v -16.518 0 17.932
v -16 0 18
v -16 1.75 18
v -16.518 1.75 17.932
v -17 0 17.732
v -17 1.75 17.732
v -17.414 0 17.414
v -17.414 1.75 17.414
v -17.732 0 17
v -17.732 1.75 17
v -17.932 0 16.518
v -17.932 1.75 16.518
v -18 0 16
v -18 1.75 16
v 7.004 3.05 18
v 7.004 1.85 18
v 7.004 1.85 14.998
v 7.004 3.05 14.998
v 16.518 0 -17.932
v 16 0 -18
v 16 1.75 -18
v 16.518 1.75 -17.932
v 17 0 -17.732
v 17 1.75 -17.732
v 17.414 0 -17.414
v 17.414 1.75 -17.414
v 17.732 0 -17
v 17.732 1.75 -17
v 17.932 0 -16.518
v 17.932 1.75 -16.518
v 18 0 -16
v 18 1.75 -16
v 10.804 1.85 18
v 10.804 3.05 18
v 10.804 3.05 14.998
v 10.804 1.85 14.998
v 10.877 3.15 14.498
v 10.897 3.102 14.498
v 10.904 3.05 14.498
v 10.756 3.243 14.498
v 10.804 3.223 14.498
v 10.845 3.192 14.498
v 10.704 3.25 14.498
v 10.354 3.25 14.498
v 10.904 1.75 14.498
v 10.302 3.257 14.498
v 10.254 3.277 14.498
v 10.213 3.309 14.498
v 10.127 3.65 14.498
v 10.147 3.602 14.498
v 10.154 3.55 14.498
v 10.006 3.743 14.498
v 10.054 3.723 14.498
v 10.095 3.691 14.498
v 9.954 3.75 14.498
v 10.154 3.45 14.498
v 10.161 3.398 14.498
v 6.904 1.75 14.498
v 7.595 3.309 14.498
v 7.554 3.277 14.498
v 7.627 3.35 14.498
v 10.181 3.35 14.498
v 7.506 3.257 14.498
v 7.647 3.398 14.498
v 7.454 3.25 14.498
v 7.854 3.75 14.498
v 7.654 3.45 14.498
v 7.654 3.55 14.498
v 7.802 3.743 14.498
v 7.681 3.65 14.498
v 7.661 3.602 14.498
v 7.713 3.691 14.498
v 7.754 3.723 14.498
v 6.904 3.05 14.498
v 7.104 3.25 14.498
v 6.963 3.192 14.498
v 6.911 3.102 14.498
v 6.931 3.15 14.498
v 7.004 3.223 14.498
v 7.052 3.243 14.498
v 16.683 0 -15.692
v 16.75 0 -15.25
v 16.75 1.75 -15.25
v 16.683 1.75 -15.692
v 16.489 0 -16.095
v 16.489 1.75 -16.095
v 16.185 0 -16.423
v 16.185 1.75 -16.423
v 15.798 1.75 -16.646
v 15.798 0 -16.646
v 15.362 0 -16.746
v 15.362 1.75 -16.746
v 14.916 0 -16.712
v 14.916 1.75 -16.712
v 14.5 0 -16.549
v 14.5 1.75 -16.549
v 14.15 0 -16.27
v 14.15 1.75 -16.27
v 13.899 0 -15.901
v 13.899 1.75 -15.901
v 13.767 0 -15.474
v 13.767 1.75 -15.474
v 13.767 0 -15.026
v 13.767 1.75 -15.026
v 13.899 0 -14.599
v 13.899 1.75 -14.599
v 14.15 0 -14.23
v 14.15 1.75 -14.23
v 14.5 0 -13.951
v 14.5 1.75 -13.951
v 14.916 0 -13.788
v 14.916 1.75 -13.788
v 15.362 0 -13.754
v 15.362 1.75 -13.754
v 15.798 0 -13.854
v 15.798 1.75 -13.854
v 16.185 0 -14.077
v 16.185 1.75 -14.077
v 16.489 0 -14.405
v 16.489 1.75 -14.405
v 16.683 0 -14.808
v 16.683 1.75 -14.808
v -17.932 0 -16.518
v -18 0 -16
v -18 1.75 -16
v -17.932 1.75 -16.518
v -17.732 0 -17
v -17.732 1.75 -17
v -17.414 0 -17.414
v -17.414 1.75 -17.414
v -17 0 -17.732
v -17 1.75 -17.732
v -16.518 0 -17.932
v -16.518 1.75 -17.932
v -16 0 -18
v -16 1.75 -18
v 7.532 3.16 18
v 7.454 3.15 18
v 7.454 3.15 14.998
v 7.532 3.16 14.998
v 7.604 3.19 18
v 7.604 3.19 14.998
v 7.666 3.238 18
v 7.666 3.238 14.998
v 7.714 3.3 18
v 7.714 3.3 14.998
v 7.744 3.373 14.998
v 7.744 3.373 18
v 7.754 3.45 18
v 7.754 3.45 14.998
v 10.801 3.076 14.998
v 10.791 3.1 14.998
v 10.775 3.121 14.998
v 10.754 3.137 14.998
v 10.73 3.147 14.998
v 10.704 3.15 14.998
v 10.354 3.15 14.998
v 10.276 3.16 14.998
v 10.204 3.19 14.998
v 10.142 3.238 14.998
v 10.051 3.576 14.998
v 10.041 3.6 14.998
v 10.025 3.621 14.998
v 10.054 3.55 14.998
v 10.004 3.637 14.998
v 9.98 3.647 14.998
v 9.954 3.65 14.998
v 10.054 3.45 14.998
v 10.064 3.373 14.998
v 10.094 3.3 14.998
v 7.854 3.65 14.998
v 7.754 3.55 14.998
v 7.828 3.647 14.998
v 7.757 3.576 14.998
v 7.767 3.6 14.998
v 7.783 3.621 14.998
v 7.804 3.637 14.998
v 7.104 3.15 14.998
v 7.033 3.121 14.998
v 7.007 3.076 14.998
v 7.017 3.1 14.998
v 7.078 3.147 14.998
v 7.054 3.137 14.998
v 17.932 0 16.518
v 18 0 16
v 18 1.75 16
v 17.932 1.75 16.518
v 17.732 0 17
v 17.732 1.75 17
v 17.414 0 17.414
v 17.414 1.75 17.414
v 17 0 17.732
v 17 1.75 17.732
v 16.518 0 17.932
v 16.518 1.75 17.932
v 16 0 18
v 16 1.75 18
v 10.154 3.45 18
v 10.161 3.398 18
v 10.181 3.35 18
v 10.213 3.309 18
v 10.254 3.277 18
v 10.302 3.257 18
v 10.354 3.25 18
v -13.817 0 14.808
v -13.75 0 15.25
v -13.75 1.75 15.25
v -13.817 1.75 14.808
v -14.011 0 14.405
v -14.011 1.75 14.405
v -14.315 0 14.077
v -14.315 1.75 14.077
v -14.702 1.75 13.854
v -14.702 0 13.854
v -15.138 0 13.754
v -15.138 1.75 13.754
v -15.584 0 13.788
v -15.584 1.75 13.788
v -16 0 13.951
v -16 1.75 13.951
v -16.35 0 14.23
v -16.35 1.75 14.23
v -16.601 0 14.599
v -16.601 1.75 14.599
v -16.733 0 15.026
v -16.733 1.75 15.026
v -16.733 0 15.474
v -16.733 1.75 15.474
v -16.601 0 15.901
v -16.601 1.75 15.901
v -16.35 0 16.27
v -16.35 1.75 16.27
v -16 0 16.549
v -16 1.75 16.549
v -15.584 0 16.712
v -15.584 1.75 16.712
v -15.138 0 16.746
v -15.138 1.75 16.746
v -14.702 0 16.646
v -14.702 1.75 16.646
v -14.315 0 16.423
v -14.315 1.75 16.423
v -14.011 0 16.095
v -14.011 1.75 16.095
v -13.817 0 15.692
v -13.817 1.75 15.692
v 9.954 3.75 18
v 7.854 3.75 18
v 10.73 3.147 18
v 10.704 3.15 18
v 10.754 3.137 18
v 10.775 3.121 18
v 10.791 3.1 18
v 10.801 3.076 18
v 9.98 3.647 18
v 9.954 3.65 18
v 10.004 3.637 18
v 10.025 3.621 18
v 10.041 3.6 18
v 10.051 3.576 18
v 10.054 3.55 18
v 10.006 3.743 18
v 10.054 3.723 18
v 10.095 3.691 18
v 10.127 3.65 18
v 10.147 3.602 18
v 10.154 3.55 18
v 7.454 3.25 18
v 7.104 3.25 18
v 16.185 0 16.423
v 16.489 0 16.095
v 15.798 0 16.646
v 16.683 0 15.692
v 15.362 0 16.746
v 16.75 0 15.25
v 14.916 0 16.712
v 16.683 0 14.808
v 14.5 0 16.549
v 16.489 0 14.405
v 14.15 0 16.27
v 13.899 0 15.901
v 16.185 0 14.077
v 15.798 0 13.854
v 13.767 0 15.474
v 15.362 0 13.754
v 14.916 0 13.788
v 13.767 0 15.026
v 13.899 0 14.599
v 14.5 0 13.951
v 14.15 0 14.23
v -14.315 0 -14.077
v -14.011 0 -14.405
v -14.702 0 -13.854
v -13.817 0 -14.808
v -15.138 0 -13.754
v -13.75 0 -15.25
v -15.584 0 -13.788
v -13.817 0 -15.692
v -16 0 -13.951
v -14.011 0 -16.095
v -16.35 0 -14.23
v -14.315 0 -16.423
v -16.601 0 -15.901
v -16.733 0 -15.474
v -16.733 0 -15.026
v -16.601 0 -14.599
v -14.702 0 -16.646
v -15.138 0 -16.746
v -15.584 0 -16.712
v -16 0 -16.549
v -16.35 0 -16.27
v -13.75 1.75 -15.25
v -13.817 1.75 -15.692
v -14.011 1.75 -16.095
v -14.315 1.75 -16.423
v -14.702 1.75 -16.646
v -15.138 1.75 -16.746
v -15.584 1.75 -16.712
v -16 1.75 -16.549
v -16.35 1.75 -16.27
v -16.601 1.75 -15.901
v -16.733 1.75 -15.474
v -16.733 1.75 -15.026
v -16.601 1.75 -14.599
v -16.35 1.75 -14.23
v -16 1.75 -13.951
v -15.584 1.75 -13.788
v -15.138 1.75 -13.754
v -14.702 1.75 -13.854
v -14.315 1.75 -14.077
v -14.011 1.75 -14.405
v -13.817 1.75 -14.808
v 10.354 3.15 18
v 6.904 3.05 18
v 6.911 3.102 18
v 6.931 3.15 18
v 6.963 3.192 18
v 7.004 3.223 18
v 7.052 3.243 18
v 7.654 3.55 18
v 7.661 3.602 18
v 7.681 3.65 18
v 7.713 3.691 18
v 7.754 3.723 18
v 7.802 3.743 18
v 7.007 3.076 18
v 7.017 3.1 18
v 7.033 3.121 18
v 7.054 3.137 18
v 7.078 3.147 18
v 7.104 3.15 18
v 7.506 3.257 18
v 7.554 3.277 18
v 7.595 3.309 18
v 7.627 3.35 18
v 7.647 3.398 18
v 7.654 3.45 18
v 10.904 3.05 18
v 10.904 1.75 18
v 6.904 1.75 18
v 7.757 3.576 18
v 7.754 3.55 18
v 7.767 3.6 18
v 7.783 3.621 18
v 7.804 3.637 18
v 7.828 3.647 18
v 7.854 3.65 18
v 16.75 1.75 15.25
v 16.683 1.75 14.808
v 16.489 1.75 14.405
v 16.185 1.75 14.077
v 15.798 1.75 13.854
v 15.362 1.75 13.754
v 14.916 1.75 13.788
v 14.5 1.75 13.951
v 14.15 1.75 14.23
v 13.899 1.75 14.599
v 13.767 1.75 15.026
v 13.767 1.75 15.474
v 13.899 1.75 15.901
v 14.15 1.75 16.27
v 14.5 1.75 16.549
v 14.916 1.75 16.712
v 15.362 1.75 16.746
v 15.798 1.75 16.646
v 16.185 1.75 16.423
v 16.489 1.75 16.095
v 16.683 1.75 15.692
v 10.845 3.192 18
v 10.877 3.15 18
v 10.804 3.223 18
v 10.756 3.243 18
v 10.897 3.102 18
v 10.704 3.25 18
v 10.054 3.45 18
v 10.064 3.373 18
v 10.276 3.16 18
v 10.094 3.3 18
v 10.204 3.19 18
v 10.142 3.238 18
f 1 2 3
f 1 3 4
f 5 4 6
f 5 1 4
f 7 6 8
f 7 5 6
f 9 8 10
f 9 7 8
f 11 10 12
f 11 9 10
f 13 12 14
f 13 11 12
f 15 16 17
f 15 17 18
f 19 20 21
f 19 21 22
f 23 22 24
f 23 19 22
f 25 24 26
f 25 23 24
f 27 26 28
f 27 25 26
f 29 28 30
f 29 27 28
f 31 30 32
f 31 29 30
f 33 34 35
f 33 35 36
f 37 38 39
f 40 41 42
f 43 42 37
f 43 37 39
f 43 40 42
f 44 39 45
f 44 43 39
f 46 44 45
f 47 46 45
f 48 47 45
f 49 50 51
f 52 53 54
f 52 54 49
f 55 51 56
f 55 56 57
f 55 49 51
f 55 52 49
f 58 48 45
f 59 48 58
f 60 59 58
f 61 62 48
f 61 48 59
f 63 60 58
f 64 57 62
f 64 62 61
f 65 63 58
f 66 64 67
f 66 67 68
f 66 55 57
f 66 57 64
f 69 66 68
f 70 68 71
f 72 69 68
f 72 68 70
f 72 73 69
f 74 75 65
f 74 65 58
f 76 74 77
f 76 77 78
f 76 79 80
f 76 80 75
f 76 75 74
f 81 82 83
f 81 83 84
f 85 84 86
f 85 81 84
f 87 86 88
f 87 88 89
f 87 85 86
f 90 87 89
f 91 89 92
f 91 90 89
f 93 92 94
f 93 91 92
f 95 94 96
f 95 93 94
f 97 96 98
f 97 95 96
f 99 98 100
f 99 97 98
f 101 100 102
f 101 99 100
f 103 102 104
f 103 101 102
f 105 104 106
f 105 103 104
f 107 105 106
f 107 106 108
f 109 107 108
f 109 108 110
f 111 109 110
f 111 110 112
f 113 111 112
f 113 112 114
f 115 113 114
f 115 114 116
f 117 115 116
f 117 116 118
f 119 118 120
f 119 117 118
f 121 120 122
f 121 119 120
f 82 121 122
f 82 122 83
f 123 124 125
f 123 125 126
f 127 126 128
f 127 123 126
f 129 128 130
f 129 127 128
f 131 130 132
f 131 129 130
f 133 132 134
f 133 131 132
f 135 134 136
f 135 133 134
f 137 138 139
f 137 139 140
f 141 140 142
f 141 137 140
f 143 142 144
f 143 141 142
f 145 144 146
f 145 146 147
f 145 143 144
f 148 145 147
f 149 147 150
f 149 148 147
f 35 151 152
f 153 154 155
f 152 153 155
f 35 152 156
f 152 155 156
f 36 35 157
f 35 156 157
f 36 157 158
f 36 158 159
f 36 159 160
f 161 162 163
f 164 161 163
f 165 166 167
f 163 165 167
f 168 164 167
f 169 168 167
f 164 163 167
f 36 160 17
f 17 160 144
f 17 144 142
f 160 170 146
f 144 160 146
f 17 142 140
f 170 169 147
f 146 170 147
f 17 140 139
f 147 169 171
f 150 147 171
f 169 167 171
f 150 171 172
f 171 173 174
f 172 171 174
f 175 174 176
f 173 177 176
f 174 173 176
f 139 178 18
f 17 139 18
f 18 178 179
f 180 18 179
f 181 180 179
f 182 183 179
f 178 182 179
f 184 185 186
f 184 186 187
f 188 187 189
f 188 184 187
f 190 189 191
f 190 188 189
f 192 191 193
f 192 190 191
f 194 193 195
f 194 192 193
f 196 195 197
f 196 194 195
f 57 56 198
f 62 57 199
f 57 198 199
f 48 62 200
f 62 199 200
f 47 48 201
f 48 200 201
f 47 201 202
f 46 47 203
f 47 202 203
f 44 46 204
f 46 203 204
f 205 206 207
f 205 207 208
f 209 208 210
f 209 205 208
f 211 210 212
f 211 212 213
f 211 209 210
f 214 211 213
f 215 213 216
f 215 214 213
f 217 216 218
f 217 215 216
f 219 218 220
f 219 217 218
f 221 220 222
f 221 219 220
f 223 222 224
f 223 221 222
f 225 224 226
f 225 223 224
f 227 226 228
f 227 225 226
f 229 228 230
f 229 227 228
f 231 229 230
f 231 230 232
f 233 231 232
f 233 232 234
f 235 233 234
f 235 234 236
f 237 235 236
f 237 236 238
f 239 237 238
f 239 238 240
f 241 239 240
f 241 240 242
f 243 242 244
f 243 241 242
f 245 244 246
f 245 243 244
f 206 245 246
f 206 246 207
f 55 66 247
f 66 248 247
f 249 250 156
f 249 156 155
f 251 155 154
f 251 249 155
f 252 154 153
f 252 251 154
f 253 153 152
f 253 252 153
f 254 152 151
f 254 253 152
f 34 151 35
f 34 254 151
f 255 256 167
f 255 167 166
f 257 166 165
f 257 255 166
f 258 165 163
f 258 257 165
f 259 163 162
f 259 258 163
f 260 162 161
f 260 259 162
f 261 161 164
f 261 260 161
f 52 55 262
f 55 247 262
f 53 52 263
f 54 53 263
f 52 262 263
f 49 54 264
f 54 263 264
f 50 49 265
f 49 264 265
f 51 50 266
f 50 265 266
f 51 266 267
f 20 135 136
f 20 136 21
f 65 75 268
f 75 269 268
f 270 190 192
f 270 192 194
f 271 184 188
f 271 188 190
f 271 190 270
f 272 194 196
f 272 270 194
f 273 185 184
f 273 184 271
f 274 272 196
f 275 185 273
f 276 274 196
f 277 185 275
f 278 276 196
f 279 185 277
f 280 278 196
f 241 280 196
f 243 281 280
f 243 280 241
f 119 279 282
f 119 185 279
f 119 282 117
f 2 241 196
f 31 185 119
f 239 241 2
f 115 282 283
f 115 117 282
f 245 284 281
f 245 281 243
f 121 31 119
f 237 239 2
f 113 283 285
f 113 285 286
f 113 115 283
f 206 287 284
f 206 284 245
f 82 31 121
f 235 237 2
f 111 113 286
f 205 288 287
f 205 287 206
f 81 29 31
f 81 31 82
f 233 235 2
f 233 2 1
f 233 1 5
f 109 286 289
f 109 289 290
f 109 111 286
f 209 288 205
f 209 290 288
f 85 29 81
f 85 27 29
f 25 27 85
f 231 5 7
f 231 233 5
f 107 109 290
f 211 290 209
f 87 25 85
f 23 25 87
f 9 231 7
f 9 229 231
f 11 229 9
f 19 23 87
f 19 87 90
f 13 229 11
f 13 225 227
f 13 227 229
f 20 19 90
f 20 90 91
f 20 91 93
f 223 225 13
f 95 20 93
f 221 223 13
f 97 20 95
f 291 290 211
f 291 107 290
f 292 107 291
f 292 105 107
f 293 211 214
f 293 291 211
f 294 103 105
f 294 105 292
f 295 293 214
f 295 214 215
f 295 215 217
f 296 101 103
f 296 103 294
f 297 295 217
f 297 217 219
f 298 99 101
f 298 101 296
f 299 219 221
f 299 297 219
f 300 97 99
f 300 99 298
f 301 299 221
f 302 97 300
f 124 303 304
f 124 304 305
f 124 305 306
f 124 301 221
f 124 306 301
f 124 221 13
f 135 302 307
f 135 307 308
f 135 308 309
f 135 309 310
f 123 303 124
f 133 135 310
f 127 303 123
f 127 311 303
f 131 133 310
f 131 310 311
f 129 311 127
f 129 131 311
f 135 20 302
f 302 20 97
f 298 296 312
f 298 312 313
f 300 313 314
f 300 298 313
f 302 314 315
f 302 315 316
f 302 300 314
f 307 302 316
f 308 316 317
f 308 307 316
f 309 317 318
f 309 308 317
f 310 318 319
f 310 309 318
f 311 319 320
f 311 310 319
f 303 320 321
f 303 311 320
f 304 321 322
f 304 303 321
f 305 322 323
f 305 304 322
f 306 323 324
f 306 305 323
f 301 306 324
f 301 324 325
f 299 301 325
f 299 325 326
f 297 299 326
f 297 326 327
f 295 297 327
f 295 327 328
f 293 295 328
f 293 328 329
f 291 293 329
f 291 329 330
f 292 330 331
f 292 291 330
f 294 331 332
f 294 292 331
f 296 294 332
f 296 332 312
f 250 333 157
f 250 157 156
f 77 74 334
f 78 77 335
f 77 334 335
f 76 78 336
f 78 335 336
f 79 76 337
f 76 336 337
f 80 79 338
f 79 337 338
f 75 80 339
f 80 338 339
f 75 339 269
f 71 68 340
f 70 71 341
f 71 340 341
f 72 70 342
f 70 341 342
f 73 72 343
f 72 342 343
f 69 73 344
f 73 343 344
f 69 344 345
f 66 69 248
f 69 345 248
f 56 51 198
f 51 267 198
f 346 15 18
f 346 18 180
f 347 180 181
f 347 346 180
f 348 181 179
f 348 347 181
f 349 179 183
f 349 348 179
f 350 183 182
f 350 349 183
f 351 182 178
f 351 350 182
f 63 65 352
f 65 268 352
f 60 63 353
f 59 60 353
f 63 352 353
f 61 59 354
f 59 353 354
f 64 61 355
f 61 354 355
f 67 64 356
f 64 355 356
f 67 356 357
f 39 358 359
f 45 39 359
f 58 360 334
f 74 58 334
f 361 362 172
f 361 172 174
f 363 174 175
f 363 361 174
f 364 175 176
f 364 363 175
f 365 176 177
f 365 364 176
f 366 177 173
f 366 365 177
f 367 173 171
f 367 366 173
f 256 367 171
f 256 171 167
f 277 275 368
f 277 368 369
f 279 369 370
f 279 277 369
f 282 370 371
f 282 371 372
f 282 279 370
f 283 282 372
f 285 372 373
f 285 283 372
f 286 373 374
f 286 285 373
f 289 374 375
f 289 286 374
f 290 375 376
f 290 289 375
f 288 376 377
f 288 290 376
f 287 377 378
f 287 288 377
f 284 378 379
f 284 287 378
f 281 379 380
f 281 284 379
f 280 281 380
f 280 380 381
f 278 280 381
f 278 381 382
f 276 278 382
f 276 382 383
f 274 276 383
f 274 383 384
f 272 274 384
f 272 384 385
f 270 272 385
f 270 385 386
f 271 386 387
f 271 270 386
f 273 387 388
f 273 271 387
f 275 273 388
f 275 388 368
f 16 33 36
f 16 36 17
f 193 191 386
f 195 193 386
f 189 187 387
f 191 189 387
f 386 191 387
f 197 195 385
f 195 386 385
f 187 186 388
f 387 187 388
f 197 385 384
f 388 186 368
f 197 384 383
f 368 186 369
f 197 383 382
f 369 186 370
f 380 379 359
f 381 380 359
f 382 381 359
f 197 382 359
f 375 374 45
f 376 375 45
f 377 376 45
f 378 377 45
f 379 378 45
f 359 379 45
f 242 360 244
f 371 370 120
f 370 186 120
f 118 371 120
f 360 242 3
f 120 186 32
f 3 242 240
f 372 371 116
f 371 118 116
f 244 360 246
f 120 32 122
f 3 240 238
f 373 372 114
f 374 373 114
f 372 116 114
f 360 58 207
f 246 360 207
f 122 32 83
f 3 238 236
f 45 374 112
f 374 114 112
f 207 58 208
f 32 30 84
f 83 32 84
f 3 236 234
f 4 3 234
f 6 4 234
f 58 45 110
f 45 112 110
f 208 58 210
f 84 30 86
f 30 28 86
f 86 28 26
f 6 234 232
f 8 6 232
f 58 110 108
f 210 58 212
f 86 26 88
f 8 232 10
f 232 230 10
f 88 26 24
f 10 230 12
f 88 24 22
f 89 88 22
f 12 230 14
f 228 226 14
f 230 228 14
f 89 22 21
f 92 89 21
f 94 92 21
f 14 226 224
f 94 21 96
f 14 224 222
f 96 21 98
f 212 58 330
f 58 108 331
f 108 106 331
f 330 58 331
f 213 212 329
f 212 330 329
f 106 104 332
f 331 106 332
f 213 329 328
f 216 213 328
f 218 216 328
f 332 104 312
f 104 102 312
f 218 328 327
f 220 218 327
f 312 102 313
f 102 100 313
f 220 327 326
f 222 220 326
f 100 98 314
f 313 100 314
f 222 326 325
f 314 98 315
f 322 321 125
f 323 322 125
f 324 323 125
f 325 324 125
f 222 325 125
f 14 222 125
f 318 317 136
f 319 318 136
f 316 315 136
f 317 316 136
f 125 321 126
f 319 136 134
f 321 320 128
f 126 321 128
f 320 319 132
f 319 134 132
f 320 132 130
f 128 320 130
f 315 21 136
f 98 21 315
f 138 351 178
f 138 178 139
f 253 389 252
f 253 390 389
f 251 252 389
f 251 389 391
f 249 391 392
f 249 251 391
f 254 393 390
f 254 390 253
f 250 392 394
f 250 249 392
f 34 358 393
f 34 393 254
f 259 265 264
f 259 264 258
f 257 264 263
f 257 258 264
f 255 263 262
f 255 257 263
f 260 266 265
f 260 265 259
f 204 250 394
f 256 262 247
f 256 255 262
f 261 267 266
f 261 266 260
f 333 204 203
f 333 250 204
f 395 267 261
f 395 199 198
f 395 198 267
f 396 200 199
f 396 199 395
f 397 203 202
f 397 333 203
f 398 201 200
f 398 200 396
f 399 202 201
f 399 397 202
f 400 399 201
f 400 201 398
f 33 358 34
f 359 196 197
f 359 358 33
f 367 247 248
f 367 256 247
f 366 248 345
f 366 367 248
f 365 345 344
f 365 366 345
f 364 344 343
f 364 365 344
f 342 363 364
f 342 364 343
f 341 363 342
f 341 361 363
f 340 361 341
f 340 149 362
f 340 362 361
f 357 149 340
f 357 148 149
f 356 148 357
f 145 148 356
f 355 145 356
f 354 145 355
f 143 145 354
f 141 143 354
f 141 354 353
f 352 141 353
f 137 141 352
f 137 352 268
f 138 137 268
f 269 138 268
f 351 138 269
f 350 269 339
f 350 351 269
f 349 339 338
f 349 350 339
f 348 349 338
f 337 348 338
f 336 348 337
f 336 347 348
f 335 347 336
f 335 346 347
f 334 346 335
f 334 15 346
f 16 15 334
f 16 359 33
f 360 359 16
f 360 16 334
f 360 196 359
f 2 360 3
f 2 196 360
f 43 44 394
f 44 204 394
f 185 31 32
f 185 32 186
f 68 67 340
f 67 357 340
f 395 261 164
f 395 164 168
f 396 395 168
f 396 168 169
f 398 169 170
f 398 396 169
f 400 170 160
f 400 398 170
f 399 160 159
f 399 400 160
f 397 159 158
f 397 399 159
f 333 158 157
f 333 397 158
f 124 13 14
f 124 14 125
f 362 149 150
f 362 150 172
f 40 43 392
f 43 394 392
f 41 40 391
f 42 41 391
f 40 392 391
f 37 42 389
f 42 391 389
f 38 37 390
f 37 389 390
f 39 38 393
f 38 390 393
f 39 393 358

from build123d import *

# Parameters (mm, degrees)
SKETCH1_R           = 1.5
BOSS_EXTRUDE3_DEPTH = 1.75
BOSS_EXTRUDE4_DEPTH = 3.00210529
BOSS_EXTRUDE5_DEPTH = 0.5


with BuildPart() as part:
    # Sketch1 → Boss-Extrude3 (new body)
    with BuildSketch(Plane(origin=(0, 0, 0), x_dir=(1, 0, 0), z_dir=(0, 1, 0))):
        with BuildLine():
            Line((16, -18), (-16, -18))
            ThreePointArc((-16, -18), (-17.414213562, -17.414213562), (-18, -16))
            Line((-18, -16), (-18, 16))
            ThreePointArc((-18, 16), (-17.414213562, 17.414213562), (-16, 18))
            Line((-16, 18), (16, 18))
            ThreePointArc((16, 18), (17.414213562, 17.414213562), (18, 16))
            Line((18, 16), (18, -16))
            ThreePointArc((18, -16), (17.414213562, -17.414213562), (16, -18))
        make_face()
        with Locations((-15.25, 15.25)):
            Circle(SKETCH1_R, mode=Mode.SUBTRACT)
        with Locations((15.25, 15.25)):
            Circle(SKETCH1_R, mode=Mode.SUBTRACT)
        with Locations((15.25, -15.25)):
            Circle(SKETCH1_R, mode=Mode.SUBTRACT)
        with Locations((-15.25, -15.25)):
            Circle(SKETCH1_R, mode=Mode.SUBTRACT)
    extrude(amount=BOSS_EXTRUDE3_DEPTH)

    # Sketch6 → Boss-Extrude4 (add)
    with BuildSketch(Plane(origin=(-4.326463131, 0, 18), x_dir=(1, 0, 0), z_dir=(0, 0, 1))):
        with BuildLine():
            Line((11.230523664, 1.75), (15.230523664, 1.75))
            Line((15.230523664, 1.75), (15.230523664, 3.050219677))
            ThreePointArc((15.230523664, 3.050219677), (15.17194502, 3.191641033), (15.030523664, 3.250219677))
            Line((15.030523664, 3.250219677), (14.680523664, 3.250219677))
            ThreePointArc((14.680523664, 3.250219677), (14.539102307, 3.308798321), (14.480523664, 3.450219677))
            Line((14.480523664, 3.450219677), (14.480523664, 3.55))
            ThreePointArc((14.480523664, 3.55), (14.42194502, 3.691421356), (14.280523664, 3.75))
            Line((14.280523664, 3.75), (12.180523664, 3.75))
            ThreePointArc((12.180523664, 3.75), (12.039102307, 3.691421356), (11.980523664, 3.55))
            Line((11.980523664, 3.55), (11.980523664, 3.450219677))
            ThreePointArc((11.980523664, 3.450219677), (11.92194502, 3.308798321), (11.780523664, 3.250219677))
            Line((11.780523664, 3.250219677), (11.430523664, 3.250219677))
            ThreePointArc((11.430523664, 3.250219677), (11.289102307, 3.191641033), (11.230523664, 3.050219677))
            Line((11.230523664, 3.050219677), (11.230523664, 1.75))
        make_face()
        with BuildLine():
            Line((12.180523664, 3.65), (14.280523664, 3.65))
            ThreePointArc((14.280523664, 3.65), (14.351234342, 3.620710678), (14.380523664, 3.55))
            Line((14.380523664, 3.55), (14.380523664, 3.450219677))
            ThreePointArc((14.380523664, 3.450219677), (14.468391629, 3.238087642), (14.680523664, 3.150219677))
            Line((14.680523664, 3.150219677), (15.030523664, 3.150219677))
            ThreePointArc((15.030523664, 3.150219677), (15.101234342, 3.120930355), (15.130523664, 3.050219677))
            Line((15.130523664, 3.050219677), (15.130523664, 1.85))
            Line((15.130523664, 1.85), (11.330523664, 1.85))
            Line((11.330523664, 1.85), (11.330523664, 3.050219677))
            ThreePointArc((11.330523664, 3.050219677), (11.359812985, 3.120930355), (11.430523664, 3.150219677))
            Line((11.430523664, 3.150219677), (11.780523664, 3.150219677))
            ThreePointArc((11.780523664, 3.150219677), (11.992655698, 3.238087642), (12.080523664, 3.450219677))
            Line((12.080523664, 3.450219677), (12.080523664, 3.55))
            ThreePointArc((12.080523664, 3.55), (12.109812985, 3.620710678), (12.180523664, 3.65))
        make_face(mode=Mode.SUBTRACT)
    extrude(amount=-BOSS_EXTRUDE4_DEPTH)

    # Sketch7 → Boss-Extrude5 (add)
    with BuildSketch(Plane(origin=(0, 0, 14.99789471), x_dir=(-1, 0, 0), z_dir=(0, 0, -1))):
        with BuildLine():
            Line((-6.904060533, 1.75), (-6.904060533, 3.050219677))
            ThreePointArc((-6.904060533, 3.050219677), (-6.962639176, 3.191641033), (-7.104060533, 3.250219677))
            Line((-7.104060533, 3.250219677), (-7.454060533, 3.250219677))
            ThreePointArc((-7.454060533, 3.250219677), (-7.595481889, 3.308798321), (-7.654060533, 3.450219677))
            Line((-7.654060533, 3.450219677), (-7.654060533, 3.55))
            ThreePointArc((-7.654060533, 3.55), (-7.712639176, 3.691421356), (-7.854060533, 3.75))
            Line((-7.854060533, 3.75), (-9.954060533, 3.75))
            ThreePointArc((-9.954060533, 3.75), (-10.095481889, 3.691421356), (-10.154060533, 3.55))
            Line((-10.154060533, 3.55), (-10.154060533, 3.450219677))
            ThreePointArc((-10.154060533, 3.450219677), (-10.212639176, 3.308798321), (-10.354060533, 3.250219677))
            Line((-10.354060533, 3.250219677), (-10.704060533, 3.250219677))
            ThreePointArc((-10.704060533, 3.250219677), (-10.845481889, 3.191641033), (-10.904060533, 3.050219677))
            Line((-10.904060533, 3.050219677), (-10.904060533, 1.75))
            Line((-10.904060533, 1.75), (-6.904060533, 1.75))
        make_face()
    extrude(amount=BOSS_EXTRUDE5_DEPTH)


solid = part.part
